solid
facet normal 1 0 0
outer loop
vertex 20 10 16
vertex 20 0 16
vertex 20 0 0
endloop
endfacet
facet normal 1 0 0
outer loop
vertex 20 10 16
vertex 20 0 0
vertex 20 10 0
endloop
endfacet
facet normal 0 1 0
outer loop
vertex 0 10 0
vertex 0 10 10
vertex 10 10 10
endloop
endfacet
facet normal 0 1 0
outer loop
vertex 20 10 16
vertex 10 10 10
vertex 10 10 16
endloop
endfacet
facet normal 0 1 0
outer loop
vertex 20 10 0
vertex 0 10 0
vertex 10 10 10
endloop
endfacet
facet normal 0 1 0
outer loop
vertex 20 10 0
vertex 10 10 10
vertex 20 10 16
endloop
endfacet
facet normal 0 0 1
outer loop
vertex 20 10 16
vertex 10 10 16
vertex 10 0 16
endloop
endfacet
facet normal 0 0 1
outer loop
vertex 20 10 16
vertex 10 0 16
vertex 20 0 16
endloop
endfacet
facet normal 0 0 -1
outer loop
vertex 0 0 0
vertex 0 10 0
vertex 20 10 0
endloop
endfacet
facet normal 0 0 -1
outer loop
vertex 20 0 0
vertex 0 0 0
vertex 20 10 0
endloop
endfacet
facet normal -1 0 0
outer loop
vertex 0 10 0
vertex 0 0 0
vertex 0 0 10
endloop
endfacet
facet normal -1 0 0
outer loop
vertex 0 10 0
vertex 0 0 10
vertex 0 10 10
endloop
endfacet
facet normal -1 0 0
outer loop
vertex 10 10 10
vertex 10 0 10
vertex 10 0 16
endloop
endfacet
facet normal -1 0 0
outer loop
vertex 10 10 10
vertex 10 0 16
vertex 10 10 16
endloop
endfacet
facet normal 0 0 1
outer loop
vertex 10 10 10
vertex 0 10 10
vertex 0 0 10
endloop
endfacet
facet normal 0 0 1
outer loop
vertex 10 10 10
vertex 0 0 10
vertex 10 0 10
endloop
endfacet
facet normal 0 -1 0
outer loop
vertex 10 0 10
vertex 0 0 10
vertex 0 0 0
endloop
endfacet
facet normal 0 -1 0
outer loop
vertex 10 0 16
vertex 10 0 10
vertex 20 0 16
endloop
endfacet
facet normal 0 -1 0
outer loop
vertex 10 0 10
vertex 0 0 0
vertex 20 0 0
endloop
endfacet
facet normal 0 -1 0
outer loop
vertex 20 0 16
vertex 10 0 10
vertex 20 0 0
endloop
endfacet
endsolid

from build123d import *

# Parameters (mm, degrees)
BOX001_W     = 10
BOX001_H     = 10
BOX001_DEPTH = 16
BOX_W        = 10
BOX_H        = 10
BOX_DEPTH    = 10


with BuildPart() as cube001:
    # Box001 → Box001 (new body)
    with BuildSketch(Plane(origin=(10, 0, 0), x_dir=(1, 0, 0), z_dir=(0, 0, 1))):
        with Locations((5, 5)):
            Rectangle(BOX001_W, BOX001_H)
    extrude(amount=BOX001_DEPTH)


with BuildPart() as fusion:
    # Box → Box (new body)
    with BuildSketch(Plane.XY):
        with Locations((5, 5)):
            Rectangle(BOX_W, BOX_H)
    extrude(amount=BOX_DEPTH)

    # Fusion: union Cube001
    add(cube001.part)


solid = fusion.part
